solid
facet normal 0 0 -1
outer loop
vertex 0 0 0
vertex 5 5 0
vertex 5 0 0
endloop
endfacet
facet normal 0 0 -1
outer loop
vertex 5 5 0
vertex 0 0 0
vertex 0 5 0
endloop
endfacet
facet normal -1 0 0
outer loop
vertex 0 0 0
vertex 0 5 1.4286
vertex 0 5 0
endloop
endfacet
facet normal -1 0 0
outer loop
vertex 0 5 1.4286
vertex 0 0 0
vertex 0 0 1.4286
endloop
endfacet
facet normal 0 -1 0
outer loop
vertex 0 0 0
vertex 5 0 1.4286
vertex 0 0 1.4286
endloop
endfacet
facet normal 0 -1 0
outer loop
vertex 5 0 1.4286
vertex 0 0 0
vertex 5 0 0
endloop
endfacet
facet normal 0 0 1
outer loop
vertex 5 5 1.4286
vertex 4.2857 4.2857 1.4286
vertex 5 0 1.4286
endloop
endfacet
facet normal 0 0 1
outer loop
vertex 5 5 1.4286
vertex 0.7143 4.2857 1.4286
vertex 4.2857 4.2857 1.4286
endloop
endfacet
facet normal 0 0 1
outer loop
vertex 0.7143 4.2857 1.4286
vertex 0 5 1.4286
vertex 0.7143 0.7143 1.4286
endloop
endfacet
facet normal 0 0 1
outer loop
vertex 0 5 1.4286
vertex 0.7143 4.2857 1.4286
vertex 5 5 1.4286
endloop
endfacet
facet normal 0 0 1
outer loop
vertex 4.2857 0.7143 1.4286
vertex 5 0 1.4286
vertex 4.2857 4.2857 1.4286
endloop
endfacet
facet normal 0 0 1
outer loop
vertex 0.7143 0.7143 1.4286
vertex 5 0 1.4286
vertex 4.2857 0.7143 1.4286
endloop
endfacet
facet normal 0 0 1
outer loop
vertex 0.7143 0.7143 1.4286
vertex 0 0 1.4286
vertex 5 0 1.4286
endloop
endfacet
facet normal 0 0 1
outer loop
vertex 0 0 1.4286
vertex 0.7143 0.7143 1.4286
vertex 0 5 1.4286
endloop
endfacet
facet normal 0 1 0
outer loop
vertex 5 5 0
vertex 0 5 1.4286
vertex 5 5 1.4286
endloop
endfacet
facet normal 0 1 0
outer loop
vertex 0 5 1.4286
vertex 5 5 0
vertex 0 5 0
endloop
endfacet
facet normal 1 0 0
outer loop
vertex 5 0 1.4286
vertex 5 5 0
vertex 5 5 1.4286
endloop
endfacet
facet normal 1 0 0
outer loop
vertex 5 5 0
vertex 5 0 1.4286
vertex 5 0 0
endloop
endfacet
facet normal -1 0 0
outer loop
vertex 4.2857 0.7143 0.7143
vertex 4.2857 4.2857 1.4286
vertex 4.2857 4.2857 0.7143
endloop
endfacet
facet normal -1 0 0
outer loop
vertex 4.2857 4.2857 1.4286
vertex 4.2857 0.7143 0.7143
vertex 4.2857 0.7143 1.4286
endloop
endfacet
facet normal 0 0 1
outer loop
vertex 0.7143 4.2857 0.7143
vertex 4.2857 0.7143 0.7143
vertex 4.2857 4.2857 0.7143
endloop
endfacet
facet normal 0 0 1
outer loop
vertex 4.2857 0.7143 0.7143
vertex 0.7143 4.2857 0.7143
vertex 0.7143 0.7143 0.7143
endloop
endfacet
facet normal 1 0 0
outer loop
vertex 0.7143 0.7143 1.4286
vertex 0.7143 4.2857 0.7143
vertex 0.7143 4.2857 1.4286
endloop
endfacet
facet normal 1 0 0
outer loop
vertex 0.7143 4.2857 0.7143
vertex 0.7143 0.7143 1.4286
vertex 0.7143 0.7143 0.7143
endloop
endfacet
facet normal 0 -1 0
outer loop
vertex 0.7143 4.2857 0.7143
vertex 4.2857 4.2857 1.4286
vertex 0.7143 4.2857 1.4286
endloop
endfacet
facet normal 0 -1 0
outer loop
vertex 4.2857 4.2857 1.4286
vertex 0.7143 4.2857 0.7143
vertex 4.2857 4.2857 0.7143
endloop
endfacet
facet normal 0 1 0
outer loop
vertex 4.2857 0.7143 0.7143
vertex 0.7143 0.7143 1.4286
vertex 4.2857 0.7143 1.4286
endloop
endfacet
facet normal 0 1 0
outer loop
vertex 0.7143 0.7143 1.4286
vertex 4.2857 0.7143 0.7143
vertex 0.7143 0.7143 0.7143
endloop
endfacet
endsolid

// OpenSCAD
// file: hollowvoxels.scad
//wt = wall thickness
module hunitcube(wt) {
	diff = 2*wt;
	cube([1,1,1]);
	translate([wt,wt,wt])
	scale([1-diff,1-diff,1-diff])
	cube([1,1,1]);
}

module hcube(v=[1,1,1], wt) {
	for (i=[0:v[0]-1]) {
	for (j=[0:v[1]-1]) {
	for (k=[0:v[2]-1]) {
		translate([i,j,k])
		hunitcube(wt);
	}
	}
	}
}

module hcubefivesevenths(v=[1,1,1]) {
	hcube(v, 0.1*7/5);
}
// main file
use <hollowvoxels.scad>;

scale([5/7,5/7,5/7]){
difference(){
hcubefivesevenths([7,7,2]);
translate([1,1,1])
cube([5,5,2]);
}
}
